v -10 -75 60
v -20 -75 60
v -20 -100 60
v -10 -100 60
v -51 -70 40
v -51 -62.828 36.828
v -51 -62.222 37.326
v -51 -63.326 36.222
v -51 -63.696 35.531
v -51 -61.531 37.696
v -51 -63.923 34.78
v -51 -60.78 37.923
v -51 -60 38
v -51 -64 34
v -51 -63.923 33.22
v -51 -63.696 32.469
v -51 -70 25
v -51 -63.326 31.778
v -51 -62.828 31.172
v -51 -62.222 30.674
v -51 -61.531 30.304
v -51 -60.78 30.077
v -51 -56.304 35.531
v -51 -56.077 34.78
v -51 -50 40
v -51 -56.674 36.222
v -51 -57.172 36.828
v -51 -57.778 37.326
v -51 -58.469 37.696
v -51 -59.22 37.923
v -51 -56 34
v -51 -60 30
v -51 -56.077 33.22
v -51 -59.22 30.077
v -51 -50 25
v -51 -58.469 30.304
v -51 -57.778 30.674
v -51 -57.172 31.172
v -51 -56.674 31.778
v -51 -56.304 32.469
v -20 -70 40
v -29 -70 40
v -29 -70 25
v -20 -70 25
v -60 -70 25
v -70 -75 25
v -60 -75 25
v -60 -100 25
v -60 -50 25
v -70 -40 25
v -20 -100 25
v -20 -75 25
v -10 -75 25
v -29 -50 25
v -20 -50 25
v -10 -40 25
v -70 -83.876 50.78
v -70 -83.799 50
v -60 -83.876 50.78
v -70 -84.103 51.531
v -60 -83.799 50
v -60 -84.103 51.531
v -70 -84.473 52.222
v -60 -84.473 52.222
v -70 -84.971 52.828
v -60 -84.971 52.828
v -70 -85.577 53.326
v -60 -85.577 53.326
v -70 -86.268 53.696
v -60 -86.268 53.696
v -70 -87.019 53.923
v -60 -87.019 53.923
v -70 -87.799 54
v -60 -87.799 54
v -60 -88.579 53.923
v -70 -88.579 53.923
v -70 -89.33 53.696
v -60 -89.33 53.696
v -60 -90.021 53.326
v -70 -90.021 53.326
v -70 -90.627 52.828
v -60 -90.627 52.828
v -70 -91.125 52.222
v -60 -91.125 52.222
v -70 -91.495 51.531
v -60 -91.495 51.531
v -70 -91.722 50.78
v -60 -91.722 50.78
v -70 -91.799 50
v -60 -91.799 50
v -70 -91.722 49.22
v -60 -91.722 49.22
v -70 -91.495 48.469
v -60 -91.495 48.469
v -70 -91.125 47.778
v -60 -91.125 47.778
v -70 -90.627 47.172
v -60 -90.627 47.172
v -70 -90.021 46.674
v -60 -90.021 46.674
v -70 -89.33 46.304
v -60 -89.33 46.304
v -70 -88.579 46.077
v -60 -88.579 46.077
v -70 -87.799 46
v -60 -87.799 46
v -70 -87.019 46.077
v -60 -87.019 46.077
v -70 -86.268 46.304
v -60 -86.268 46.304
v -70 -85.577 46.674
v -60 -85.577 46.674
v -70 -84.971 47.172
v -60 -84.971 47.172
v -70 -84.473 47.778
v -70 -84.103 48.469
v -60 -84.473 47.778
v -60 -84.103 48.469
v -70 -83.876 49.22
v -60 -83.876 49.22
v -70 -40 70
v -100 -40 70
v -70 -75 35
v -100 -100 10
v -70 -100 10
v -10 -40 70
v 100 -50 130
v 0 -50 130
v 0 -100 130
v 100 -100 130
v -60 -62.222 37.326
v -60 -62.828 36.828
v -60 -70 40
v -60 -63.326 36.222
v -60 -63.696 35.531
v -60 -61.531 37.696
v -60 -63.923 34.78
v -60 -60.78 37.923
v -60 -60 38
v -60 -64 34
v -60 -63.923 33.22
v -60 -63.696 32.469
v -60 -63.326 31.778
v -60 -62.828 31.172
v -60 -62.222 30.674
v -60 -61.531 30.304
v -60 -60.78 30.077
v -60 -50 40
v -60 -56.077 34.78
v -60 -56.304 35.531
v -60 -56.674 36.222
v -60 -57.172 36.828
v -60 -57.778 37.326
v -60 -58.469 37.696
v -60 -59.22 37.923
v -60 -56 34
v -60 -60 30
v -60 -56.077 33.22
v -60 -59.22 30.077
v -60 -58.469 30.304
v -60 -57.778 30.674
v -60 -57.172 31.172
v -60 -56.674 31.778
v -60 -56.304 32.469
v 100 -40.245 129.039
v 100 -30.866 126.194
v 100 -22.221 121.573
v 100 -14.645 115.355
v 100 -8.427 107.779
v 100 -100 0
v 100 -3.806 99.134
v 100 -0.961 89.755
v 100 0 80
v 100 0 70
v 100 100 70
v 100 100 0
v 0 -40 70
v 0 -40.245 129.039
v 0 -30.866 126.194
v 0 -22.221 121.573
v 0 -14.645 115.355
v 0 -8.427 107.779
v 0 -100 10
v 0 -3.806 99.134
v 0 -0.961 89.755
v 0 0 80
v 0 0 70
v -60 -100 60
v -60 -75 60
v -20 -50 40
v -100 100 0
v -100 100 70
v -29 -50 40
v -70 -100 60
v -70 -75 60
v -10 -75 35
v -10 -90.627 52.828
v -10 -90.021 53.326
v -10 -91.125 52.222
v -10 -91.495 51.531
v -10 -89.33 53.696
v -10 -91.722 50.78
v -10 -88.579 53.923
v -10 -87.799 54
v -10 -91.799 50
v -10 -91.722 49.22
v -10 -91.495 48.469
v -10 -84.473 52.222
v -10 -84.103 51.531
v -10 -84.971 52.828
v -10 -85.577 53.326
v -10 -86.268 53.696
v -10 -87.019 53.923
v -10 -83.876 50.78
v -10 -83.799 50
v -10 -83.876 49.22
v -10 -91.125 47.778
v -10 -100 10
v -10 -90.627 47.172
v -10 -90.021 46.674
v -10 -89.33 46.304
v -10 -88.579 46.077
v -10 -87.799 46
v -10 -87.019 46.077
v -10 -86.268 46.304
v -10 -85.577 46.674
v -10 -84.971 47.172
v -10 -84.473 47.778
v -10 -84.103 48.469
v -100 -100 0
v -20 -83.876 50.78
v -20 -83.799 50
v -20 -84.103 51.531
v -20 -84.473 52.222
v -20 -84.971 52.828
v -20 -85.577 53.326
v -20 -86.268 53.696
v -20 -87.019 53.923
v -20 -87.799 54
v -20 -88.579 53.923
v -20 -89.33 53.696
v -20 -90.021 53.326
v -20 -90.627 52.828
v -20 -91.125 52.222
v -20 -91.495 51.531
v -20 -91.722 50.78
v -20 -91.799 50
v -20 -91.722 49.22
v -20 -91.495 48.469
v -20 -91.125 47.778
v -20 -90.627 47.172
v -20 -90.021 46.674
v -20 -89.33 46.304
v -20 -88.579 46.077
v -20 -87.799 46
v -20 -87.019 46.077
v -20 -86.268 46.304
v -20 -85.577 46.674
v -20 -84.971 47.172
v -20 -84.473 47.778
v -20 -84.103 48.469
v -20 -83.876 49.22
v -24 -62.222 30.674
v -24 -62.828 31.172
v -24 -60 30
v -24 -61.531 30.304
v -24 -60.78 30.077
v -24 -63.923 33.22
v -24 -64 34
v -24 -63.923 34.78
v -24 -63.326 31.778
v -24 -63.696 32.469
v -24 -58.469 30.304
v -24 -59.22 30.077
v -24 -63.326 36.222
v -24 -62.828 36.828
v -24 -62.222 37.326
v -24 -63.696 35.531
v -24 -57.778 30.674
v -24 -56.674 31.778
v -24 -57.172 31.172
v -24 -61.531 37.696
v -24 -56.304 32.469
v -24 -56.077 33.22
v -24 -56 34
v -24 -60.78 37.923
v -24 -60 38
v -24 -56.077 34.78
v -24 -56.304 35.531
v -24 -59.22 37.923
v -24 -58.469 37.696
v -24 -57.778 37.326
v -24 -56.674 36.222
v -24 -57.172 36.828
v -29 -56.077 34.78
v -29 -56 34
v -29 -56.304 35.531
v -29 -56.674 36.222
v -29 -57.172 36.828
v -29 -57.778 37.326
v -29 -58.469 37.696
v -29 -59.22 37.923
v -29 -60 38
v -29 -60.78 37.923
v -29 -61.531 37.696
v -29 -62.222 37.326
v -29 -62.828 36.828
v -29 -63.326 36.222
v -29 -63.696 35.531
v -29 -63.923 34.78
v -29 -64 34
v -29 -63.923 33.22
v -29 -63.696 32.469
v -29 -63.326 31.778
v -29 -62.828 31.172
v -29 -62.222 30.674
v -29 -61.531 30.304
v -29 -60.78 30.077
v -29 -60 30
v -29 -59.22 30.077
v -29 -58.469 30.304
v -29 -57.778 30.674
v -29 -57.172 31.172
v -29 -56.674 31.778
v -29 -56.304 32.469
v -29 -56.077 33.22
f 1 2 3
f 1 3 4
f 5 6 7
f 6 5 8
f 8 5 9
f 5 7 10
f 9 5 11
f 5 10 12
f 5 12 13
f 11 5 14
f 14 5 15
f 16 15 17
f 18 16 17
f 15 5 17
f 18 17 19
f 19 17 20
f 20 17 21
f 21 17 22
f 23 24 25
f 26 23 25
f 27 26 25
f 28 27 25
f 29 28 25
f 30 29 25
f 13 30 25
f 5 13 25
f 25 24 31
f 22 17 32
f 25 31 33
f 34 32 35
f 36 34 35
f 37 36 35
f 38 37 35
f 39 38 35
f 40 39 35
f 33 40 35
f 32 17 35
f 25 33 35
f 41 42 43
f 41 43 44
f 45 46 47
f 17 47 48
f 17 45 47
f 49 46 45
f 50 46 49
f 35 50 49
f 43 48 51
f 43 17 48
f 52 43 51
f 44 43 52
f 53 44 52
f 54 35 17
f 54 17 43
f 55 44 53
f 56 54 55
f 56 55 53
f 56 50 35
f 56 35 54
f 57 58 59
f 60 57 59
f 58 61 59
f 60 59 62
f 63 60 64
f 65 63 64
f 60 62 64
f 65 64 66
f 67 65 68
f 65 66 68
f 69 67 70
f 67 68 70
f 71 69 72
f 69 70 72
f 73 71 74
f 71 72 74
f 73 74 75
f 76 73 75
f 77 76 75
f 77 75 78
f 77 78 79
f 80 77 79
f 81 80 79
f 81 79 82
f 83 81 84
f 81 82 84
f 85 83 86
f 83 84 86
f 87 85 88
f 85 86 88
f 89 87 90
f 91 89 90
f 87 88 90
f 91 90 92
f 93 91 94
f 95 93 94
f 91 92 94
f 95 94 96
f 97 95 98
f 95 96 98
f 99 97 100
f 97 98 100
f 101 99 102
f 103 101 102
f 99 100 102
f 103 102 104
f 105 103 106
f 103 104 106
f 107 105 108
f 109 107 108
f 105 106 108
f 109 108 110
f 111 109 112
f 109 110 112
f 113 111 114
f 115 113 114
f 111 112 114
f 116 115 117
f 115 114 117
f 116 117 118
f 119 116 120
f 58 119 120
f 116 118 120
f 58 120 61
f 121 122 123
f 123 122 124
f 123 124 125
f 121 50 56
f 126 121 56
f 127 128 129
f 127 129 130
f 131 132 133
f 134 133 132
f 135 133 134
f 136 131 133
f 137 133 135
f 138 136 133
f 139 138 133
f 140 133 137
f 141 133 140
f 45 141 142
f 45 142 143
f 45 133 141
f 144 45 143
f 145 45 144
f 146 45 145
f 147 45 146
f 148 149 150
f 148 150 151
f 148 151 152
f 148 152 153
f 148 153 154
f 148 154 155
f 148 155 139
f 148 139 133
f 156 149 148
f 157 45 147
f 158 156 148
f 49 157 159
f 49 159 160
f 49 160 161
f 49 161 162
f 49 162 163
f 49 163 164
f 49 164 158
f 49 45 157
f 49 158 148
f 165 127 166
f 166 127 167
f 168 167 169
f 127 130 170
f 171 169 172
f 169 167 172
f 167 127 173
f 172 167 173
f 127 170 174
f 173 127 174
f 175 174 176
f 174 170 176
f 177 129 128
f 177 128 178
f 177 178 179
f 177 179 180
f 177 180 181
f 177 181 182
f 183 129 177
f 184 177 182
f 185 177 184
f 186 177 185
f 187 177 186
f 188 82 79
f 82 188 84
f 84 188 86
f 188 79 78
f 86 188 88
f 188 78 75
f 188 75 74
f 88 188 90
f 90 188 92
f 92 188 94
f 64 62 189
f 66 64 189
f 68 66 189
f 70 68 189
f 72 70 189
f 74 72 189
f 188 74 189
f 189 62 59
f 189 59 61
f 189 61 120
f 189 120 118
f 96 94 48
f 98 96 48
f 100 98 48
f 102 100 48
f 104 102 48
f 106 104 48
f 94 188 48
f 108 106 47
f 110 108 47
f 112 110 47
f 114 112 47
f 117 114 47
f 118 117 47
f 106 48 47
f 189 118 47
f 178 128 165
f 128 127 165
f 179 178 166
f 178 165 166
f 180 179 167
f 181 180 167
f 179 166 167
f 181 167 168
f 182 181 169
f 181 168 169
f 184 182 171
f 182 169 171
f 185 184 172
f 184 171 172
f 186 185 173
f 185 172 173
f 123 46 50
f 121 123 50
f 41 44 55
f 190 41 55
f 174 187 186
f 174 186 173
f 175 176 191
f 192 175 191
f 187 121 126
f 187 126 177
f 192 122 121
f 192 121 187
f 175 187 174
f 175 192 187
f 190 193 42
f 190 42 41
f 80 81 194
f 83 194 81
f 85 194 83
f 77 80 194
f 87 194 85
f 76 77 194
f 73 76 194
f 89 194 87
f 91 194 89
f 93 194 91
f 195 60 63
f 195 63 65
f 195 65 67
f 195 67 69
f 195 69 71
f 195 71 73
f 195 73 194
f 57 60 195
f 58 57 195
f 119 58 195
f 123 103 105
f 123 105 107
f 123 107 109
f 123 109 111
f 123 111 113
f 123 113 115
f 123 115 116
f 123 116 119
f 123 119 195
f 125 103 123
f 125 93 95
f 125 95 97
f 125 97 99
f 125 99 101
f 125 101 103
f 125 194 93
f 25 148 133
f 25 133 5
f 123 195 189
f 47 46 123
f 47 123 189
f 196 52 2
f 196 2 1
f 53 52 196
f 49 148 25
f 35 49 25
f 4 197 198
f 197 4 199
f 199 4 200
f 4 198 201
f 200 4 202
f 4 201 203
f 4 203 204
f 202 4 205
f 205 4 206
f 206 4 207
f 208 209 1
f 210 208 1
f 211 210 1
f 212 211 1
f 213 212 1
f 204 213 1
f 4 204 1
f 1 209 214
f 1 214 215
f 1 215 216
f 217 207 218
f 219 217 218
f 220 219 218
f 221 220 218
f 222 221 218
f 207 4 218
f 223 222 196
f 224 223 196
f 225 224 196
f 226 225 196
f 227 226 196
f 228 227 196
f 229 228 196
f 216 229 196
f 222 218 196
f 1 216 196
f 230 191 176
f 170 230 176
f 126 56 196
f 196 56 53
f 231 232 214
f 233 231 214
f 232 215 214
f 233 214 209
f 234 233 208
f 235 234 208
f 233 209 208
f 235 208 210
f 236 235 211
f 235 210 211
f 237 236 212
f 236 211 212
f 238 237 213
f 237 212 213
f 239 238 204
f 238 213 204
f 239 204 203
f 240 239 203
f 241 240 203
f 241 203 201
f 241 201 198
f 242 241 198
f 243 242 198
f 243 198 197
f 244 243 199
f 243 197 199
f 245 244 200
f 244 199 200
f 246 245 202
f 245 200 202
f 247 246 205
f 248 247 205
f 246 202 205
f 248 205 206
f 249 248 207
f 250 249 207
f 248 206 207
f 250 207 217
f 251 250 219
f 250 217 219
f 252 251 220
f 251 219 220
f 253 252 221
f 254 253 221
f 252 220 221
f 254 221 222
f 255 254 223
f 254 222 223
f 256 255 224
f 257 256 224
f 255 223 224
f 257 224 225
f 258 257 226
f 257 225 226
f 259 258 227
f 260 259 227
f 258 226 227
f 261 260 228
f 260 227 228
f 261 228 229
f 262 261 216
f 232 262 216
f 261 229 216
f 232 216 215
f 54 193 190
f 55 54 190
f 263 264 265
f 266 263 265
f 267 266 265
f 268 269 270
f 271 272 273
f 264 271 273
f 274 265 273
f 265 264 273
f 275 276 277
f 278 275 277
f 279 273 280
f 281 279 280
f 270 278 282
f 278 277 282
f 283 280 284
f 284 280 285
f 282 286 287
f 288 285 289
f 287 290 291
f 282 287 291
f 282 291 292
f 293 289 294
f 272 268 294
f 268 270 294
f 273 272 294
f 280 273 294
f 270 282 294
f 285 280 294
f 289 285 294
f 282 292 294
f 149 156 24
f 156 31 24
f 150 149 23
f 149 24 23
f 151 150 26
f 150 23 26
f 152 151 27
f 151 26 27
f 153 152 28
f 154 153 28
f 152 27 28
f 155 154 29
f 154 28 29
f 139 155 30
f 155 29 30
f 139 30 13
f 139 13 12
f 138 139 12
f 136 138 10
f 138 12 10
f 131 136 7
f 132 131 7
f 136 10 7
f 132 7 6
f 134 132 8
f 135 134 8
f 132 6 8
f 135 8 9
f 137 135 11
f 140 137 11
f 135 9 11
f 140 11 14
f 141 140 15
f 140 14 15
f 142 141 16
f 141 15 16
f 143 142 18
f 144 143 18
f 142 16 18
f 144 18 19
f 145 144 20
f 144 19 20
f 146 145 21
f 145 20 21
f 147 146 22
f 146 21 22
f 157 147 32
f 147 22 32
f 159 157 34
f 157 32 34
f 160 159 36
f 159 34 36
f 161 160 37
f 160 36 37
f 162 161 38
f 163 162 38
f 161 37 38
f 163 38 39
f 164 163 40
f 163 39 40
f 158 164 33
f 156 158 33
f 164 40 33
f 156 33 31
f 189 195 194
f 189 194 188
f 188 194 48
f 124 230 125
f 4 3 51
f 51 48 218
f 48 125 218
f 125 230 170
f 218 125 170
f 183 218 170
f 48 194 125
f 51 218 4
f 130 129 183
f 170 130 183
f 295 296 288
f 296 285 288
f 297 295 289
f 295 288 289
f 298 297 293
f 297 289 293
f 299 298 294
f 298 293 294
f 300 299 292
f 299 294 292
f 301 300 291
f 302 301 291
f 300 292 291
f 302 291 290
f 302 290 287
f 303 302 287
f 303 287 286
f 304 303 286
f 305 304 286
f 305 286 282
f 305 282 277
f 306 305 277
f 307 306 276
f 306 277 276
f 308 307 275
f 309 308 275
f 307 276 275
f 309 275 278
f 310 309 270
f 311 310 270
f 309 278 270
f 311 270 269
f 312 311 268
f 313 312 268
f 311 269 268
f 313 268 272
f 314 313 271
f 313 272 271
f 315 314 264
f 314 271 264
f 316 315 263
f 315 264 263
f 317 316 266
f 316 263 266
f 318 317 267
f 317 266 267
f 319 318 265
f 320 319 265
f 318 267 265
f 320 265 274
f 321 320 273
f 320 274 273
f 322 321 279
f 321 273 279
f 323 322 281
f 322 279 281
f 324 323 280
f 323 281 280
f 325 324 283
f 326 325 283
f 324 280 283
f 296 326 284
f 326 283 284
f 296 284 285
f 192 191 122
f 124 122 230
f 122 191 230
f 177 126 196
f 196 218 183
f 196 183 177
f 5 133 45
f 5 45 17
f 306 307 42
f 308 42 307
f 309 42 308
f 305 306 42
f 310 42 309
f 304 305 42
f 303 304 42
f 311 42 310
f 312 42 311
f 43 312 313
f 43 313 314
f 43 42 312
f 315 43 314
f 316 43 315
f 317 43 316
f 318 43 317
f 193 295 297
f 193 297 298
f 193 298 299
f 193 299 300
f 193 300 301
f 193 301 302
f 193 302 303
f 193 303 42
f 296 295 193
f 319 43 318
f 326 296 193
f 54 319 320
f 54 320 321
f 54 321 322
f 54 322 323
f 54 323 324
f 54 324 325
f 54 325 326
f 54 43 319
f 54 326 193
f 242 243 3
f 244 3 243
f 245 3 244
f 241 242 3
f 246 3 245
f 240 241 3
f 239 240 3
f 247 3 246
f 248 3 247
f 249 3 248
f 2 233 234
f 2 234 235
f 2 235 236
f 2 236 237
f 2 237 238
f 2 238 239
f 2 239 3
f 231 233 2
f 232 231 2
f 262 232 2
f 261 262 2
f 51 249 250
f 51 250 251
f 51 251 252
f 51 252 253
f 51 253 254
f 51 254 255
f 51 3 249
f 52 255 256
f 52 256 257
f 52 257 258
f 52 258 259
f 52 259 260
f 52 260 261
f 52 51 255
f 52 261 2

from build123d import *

# Parameters (mm, degrees)
F1_DEPTH  = 70
F0_W      = 100
F0_H      = 100
F2_DEPTH  = 130
F3_R      = 50
F4_SIZE   = 60
F0_W_2    = 10
F0_H_2    = 25
F5_DEPTH  = 60
F0_W_3    = 9
F0_H_3    = 20
F6_DEPTH  = 25
F7_DEPTH  = 40
F9_R      = 4
F10_DEPTH = 21
F11_DEPTH = 36.4


with BuildPart() as f1:
    # F0 (on Top) → F1 (new body)
    with BuildSketch(Plane.XY):
        Polygon((-10, -100), (0, -100), (0, 0), (100, 0), (100, 100), (-100, 100), (-100, -100), (-80, -100), (-70, -100), (-70, -75), (-70, -40), (-10, -40), (-10, -75), align=None)
    extrude(amount=F1_DEPTH)

    # F0 (on Top) → F2 (join)
    with BuildSketch(Plane.XY):
        with Locations((50, -50)):
            Rectangle(F0_W, F0_H)
    extrude(amount=F2_DEPTH)

    # F3
    f3_edges = [f1.edges().sort_by_distance(p)[0] for p in [
        (50, 0, 130),
    ]]
    fillet(f3_edges, radius=F3_R)

    # F4
    f4_edges = [f1.edges().sort_by_distance(p)[0] for p in [
        (-85, -100, 70),
        (-5, -100, 70),
    ]]
    chamfer(f4_edges, length=F4_SIZE)

    # F0 (on Top) → F5 (join)
    with BuildSketch(Plane.XY):
        with Locations((-65, -87.5)):
            Rectangle(F0_W_2, F0_H_2)
        with Locations((-15, -87.5)):
            Rectangle(F0_W_2, F0_H_2)
    extrude(amount=F5_DEPTH)

    # F0 (on Top) → F6 (join)
    with BuildSketch(Plane.XY):
        Polygon((-60, -100), (-20, -100), (-20, -75), (-10, -75), (-10, -40), (-70, -40), (-70, -75), (-60, -75), align=None)
        with Locations((-55.5, -60)):
            Rectangle(F0_W_3, F0_H_3, mode=Mode.SUBTRACT)
        with Locations((-24.5, -60)):
            Rectangle(F0_W_3, F0_H_3, mode=Mode.SUBTRACT)
    extrude(amount=F6_DEPTH)

    # F0 (on Top) → F7 (join)
    with BuildSketch(Plane.XY):
        with Locations((-24.5, -60)):
            Rectangle(F0_W_3, F0_H_3)
        with Locations((-55.5, -60)):
            Rectangle(F0_W_3, F0_H_3)
    extrude(amount=F7_DEPTH)

    # F9 (on offset) → F10 (cut, symmetric)
    with BuildSketch(Plane.YZ.offset(-45)):
        with Locations((-60, 34)):
            Circle(F9_R)
    extrude(amount=F10_DEPTH, both=True, mode=Mode.SUBTRACT)

    # F9 (on offset) → F11 (cut, symmetric)
    with BuildSketch(Plane.YZ.offset(-45)):
        with Locations((-87.799012661, 50)):
            Circle(F9_R)
    extrude(amount=F11_DEPTH, both=True, mode=Mode.SUBTRACT)


solid = f1.part
